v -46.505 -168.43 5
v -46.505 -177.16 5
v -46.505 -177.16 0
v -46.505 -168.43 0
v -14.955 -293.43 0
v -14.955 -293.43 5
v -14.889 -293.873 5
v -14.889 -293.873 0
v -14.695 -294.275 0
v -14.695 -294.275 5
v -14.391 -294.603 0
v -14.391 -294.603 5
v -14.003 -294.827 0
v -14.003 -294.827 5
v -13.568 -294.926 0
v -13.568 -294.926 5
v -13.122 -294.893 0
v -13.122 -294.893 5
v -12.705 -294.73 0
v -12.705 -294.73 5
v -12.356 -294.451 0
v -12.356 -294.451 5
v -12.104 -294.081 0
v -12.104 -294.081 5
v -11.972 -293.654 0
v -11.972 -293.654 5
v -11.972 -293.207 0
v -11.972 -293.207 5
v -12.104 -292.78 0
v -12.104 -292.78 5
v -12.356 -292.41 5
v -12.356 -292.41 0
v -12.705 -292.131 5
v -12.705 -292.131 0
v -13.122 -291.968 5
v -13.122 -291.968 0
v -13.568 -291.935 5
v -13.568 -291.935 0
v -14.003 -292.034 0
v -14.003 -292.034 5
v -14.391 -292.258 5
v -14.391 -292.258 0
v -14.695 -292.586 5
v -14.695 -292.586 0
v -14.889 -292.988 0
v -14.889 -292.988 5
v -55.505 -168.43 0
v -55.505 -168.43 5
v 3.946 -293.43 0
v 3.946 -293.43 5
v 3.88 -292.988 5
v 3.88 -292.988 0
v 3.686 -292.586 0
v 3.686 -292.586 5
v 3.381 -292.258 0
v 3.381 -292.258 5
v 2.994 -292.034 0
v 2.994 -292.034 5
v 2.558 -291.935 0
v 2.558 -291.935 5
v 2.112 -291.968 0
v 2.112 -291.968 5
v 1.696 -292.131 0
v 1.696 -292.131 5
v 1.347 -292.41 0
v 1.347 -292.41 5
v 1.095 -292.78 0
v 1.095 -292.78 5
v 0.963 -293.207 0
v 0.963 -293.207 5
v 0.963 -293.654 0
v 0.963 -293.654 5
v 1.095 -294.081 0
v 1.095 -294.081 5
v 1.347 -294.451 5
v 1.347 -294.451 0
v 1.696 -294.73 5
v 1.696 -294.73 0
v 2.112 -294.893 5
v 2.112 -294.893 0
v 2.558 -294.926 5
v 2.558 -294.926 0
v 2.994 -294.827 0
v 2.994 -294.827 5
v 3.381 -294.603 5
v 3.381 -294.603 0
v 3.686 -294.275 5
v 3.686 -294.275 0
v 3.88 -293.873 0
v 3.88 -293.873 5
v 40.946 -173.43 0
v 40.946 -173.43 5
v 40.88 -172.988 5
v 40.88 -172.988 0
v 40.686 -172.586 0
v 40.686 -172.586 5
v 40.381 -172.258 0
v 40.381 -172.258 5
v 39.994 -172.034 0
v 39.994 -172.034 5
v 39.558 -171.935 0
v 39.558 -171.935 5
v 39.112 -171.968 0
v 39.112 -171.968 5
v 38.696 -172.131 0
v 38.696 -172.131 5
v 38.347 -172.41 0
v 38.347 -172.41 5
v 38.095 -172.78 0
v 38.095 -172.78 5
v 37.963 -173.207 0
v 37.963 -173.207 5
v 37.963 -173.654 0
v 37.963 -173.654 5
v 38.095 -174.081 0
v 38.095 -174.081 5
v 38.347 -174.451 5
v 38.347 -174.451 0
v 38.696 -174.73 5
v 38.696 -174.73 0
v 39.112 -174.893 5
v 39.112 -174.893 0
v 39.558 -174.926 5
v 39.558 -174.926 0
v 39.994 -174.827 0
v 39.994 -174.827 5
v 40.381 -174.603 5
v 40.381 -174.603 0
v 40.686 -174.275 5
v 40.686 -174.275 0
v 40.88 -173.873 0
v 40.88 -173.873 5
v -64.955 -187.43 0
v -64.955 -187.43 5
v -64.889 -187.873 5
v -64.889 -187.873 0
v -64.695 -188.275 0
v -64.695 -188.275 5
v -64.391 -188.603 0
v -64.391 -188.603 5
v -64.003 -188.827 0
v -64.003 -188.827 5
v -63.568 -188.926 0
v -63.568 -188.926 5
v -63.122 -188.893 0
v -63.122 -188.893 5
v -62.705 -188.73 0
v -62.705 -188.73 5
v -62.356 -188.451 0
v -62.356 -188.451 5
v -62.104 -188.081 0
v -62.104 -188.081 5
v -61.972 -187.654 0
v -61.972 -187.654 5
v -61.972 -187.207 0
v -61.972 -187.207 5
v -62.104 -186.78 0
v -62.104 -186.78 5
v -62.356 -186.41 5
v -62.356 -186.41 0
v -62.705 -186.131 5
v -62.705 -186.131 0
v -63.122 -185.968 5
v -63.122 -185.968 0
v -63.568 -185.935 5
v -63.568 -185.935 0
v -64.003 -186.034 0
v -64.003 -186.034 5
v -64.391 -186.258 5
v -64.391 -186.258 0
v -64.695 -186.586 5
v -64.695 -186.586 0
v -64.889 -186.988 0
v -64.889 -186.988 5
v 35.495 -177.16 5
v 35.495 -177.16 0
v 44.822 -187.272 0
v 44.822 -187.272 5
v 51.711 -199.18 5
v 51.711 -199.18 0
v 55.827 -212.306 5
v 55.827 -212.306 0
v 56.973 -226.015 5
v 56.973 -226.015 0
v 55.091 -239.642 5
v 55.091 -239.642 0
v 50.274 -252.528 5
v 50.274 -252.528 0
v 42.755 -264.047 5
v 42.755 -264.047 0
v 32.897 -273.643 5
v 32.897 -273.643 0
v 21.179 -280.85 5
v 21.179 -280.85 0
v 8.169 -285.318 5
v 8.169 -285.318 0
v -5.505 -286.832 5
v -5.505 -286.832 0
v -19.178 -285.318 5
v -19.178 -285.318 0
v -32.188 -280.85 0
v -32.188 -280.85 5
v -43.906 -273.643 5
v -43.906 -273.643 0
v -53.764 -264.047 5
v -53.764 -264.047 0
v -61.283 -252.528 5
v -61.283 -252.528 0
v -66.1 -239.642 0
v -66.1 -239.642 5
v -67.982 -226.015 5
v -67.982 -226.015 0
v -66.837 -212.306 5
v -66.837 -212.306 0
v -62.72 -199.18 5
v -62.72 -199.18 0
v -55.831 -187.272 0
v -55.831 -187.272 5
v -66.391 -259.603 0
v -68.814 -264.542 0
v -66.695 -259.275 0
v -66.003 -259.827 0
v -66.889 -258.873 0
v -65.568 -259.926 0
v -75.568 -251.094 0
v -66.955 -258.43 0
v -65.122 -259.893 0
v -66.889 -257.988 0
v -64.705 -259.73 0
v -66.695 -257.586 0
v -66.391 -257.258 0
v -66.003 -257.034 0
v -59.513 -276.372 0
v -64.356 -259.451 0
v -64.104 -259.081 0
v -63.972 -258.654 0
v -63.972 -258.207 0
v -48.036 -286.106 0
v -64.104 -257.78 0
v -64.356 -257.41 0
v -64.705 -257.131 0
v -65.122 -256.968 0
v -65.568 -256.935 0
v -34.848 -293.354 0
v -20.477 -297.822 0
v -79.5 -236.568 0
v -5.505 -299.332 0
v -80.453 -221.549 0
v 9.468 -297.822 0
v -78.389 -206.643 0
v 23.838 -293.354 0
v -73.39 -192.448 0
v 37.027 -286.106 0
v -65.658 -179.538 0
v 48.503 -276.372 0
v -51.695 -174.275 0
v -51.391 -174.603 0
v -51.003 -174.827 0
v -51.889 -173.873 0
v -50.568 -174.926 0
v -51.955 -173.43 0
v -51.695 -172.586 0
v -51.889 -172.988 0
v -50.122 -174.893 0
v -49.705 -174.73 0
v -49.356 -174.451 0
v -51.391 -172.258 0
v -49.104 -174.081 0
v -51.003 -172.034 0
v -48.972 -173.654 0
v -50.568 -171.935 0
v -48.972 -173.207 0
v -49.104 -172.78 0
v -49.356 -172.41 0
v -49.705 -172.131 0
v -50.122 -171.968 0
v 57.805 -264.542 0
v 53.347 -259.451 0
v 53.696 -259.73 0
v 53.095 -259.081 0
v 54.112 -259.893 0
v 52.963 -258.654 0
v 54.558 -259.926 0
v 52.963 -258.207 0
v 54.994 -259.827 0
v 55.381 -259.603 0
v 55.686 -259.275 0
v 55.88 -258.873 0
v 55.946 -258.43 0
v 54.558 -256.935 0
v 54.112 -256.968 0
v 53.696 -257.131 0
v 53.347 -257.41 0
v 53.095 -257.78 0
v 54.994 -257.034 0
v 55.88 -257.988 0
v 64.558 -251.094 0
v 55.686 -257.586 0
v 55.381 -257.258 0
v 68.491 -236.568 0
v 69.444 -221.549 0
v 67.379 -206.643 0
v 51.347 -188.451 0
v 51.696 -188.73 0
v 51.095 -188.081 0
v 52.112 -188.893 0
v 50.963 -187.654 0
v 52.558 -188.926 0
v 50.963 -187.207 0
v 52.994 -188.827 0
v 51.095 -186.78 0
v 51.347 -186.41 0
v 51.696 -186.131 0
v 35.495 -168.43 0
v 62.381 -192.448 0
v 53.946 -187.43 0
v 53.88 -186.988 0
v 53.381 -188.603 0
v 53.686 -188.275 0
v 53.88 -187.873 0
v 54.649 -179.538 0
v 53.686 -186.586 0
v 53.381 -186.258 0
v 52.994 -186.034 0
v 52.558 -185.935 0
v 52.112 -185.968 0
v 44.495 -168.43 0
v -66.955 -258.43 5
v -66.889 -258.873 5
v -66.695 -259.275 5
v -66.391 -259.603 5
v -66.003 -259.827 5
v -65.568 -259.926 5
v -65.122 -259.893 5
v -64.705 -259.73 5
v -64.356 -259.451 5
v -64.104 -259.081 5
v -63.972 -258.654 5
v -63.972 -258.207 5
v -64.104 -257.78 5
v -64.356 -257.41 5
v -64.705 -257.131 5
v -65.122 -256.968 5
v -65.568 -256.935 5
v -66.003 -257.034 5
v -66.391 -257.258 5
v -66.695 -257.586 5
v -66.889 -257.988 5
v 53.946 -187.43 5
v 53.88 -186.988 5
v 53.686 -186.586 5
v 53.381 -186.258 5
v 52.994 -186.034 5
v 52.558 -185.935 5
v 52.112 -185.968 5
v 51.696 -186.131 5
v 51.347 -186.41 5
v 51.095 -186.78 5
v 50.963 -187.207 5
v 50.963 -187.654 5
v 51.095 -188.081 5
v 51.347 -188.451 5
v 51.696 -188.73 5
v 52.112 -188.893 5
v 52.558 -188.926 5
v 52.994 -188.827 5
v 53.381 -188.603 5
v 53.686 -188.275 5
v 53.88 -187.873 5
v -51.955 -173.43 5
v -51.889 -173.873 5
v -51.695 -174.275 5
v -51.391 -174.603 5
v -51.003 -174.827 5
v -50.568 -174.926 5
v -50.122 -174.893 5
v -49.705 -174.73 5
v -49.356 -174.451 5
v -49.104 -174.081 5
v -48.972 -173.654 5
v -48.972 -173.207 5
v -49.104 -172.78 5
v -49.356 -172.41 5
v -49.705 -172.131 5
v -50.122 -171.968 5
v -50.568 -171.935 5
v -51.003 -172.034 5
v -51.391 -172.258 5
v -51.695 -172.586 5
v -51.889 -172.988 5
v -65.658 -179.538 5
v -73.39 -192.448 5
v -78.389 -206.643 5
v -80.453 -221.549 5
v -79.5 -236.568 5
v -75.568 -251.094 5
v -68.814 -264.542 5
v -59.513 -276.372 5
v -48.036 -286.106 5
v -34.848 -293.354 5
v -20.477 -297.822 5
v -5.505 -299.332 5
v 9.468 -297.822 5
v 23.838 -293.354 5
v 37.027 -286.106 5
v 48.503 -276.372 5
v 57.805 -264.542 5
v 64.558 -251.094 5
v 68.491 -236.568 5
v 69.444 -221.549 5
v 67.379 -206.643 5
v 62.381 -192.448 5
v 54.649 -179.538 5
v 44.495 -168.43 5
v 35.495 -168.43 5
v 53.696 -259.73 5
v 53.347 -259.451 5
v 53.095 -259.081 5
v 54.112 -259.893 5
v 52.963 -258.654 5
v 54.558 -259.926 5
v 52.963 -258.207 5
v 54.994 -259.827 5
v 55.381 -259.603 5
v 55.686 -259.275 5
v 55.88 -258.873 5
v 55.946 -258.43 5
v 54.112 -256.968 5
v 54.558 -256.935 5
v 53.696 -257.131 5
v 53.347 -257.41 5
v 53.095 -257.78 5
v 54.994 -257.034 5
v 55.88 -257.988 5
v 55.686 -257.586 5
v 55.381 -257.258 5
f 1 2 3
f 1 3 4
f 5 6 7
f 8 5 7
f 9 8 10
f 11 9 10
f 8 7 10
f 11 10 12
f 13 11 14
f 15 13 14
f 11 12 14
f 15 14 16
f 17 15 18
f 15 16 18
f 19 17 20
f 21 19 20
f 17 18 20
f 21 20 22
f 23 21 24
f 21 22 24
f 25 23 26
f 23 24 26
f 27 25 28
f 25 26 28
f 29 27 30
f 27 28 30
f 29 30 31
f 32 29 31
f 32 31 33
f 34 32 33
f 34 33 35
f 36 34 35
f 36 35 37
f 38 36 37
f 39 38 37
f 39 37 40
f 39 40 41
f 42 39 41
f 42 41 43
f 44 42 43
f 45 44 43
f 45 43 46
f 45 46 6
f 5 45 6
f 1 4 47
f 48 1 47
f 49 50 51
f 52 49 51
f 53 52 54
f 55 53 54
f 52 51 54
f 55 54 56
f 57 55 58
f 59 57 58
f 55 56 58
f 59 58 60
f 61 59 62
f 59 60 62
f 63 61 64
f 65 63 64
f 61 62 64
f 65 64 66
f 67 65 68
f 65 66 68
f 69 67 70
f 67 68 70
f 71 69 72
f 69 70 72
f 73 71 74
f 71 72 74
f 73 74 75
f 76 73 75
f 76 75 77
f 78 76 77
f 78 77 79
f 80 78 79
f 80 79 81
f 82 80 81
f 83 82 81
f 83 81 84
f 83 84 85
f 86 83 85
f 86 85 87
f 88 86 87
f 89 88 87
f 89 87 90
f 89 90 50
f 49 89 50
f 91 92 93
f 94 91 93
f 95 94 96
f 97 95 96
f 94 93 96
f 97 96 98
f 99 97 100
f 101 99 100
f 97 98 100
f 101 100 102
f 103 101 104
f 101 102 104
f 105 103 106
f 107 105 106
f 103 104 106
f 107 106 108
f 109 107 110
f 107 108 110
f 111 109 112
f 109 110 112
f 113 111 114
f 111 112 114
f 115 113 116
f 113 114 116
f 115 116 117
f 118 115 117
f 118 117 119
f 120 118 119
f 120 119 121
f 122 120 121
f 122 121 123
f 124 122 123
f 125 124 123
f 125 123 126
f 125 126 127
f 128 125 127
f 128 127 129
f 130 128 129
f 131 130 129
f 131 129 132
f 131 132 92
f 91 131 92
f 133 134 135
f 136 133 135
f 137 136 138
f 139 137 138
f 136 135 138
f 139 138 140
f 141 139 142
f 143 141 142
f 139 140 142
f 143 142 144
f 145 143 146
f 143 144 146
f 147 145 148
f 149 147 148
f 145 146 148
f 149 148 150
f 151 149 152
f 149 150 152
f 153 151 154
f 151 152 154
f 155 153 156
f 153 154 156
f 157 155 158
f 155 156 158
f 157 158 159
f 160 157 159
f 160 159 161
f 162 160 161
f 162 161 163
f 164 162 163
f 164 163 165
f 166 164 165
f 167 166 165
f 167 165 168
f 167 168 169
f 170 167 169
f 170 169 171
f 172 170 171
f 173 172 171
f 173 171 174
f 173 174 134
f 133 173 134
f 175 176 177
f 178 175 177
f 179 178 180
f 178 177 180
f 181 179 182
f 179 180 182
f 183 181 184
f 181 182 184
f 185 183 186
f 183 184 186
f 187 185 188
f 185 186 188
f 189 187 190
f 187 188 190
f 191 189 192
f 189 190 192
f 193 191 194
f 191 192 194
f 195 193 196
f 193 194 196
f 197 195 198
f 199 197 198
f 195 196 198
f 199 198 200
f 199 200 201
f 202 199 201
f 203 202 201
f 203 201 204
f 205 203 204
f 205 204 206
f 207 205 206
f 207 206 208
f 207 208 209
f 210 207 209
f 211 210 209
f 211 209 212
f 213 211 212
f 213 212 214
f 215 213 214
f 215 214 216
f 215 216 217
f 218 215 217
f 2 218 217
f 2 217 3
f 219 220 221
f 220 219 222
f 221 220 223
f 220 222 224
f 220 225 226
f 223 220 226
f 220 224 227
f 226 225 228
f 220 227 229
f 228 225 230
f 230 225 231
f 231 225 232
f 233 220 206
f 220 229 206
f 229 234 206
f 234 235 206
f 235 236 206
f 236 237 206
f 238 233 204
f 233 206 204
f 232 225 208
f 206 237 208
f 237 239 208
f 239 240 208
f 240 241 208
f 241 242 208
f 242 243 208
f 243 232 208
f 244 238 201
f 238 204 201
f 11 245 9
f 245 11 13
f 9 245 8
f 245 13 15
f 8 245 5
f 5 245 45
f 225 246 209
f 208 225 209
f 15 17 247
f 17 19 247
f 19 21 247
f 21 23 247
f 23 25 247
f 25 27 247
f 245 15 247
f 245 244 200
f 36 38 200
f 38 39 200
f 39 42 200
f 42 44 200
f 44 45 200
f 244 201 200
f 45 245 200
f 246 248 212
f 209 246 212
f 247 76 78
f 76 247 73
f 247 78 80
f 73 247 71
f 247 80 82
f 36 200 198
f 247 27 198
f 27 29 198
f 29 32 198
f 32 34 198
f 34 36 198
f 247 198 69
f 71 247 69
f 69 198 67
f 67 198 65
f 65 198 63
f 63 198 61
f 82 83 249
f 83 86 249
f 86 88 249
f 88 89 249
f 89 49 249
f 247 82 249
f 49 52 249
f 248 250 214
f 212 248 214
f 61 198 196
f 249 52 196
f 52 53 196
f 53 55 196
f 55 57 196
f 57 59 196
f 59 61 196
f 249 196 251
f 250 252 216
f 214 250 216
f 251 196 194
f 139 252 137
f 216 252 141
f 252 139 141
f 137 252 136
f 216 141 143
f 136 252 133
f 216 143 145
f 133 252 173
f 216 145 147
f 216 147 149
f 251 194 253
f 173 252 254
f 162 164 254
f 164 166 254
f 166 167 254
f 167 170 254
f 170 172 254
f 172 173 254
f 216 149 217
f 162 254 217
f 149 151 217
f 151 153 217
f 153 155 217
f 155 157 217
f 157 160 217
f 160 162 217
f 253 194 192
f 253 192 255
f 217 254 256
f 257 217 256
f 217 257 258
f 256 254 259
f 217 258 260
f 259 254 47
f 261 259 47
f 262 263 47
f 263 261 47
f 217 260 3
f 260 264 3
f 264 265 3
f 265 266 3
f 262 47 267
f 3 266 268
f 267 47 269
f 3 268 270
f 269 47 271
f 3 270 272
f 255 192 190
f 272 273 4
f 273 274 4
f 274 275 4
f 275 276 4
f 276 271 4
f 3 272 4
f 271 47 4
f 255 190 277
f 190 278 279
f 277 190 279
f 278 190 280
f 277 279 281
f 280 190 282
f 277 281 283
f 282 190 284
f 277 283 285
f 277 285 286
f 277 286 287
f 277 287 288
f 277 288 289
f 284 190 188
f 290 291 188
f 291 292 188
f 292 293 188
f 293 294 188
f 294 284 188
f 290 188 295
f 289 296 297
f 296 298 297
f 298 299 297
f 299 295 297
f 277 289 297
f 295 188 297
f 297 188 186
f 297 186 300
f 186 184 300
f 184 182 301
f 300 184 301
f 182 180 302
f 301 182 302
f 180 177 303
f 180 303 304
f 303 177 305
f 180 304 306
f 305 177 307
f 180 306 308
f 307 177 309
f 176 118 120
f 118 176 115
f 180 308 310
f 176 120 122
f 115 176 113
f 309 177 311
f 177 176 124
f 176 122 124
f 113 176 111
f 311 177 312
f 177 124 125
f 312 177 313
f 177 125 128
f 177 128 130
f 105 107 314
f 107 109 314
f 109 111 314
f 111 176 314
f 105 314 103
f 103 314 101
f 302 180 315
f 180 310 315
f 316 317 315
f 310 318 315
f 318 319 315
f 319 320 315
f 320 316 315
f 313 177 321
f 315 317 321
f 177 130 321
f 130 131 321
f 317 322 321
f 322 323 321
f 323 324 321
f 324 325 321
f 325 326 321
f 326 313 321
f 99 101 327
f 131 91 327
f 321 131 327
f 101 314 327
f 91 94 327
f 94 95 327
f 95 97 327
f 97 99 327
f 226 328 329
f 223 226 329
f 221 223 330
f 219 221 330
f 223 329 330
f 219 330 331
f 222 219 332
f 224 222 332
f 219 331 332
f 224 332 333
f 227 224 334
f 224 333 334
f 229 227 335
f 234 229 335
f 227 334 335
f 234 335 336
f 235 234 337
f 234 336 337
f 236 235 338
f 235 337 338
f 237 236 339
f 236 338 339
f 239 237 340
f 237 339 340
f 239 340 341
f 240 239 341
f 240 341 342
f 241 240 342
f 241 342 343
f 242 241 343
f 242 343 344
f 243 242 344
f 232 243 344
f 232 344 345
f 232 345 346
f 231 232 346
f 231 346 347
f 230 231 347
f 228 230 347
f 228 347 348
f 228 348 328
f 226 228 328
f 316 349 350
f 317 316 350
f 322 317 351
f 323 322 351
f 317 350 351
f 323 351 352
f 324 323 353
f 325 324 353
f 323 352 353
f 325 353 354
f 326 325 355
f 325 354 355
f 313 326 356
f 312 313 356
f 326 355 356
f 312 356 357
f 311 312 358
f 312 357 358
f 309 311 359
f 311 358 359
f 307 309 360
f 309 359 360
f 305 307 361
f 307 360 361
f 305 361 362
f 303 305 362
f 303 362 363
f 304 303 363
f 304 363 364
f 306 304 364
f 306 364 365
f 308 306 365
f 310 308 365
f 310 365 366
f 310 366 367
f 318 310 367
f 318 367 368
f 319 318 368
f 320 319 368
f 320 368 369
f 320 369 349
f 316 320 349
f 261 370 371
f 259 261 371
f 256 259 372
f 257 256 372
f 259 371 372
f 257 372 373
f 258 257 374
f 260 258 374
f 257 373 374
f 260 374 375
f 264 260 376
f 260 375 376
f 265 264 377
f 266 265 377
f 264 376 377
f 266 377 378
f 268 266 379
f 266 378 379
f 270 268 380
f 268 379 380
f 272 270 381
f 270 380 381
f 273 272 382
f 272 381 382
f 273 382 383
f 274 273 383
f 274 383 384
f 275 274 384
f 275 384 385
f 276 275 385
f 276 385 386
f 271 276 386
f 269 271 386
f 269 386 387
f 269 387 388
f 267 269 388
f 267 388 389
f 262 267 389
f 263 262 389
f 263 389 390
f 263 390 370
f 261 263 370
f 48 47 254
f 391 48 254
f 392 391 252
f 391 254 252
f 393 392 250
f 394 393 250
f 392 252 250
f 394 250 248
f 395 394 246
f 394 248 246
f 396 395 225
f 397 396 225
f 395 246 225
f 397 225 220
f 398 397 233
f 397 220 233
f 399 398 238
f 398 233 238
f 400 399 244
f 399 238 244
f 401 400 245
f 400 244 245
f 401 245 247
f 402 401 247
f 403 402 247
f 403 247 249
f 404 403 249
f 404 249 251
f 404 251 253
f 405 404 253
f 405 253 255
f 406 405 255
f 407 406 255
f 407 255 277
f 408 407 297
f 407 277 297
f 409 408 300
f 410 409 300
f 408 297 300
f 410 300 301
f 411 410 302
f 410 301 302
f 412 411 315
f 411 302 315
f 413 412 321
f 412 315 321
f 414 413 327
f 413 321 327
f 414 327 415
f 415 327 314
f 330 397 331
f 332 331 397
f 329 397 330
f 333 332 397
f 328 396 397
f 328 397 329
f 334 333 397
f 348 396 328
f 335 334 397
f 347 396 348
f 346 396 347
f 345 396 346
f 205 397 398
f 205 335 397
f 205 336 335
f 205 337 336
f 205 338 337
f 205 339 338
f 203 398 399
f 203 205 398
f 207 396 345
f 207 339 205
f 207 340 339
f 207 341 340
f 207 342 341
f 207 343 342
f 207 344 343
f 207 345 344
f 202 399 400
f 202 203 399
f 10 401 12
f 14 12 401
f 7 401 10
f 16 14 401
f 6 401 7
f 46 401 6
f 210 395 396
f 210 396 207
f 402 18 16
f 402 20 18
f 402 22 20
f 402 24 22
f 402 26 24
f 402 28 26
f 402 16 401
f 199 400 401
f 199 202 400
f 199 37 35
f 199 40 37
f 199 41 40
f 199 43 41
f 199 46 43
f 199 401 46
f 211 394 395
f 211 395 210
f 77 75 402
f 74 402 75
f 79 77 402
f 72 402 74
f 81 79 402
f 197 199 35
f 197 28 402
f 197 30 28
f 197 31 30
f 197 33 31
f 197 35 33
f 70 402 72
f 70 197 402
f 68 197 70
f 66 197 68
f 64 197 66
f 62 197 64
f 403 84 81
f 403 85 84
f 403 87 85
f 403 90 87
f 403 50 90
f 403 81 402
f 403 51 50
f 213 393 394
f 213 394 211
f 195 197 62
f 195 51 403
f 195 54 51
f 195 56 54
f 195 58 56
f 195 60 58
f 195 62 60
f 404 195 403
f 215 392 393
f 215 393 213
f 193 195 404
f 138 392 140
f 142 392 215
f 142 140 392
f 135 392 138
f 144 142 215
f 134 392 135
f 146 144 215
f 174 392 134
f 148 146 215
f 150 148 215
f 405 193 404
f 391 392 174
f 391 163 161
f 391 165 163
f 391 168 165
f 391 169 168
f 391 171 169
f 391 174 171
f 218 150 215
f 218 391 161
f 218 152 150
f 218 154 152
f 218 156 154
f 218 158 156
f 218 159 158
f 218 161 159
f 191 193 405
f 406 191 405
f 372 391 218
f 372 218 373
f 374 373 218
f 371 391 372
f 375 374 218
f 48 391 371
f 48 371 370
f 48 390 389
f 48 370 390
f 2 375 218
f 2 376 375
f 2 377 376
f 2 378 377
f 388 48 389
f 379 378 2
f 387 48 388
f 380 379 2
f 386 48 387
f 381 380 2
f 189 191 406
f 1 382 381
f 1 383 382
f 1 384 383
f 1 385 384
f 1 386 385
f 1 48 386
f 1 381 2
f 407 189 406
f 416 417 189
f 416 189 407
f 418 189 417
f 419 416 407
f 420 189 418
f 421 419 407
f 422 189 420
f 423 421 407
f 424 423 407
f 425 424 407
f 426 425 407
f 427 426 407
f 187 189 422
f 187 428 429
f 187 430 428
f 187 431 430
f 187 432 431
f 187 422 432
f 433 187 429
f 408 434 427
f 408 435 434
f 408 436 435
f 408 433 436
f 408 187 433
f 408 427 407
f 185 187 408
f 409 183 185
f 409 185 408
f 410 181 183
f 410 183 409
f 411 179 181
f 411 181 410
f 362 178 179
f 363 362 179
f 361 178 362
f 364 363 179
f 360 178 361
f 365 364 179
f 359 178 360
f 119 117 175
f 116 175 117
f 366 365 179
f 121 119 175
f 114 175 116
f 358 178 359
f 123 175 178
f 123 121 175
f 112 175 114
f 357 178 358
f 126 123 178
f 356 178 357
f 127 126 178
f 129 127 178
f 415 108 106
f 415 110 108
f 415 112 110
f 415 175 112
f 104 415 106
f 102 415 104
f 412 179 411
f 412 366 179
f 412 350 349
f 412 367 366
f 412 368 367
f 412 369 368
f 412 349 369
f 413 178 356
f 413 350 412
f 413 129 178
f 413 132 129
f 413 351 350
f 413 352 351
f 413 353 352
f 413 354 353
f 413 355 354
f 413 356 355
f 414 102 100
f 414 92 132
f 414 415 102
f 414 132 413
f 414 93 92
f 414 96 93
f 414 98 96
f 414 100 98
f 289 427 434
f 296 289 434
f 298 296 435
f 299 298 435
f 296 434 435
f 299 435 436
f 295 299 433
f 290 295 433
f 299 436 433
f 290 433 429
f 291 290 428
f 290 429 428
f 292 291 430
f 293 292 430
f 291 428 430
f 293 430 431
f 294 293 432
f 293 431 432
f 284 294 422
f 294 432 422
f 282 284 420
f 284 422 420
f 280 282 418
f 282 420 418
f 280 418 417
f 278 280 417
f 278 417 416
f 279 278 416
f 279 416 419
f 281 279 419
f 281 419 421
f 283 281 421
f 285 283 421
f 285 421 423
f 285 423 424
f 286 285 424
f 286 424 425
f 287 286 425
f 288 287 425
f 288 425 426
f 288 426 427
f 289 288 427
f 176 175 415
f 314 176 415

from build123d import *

# Parameters (mm, degrees)
RESSALTO_EXTRUS_O1_DEPTH = 5
ESBO_O2_R                = 1.5
CORTE_EXTRUS_O1_DEPTH    = 311.009274327
ESBO_O3_W                = 82
ESBO_O3_H                = 18.792940288
CORTE_EXTRUS_O2_DEPTH    = 10


with BuildPart() as part:
    # Esboço1 → Ressalto-extrusão1 (new body)
    with BuildSketch(Plane.XY):
        with BuildLine():
            Line((44.495405461, -168.430491325), (22.44625518, -168.430491325))
            ThreePointArc((22.44625518, -168.430491325), (-5.504594539, -286.832190763), (-33.455444258, -168.430491325))
            Line((-33.455444258, -168.430491325), (-55.504594539, -168.430491325))
            ThreePointArc((-55.504594539, -168.430491325), (-5.504594539, -299.332190763), (44.495405461, -168.430491325))
        make_face()
    extrude(amount=RESSALTO_EXTRUS_O1_DEPTH)

    # Esboço2 → Corte-extrusão1 (cut, through all)
    with BuildSketch(Plane.XY.offset(5)):
        with Locations((39.44625518, -173.430491325)):
            Circle(ESBO_O2_R)
        with Locations((52.44625518, -187.430491325)):
            Circle(ESBO_O2_R)
        with Locations((54.44625518, -258.430491325)):
            Circle(ESBO_O2_R)
        with Locations(Location((-13.455444258, -293.430491325, 0), (0, 0, 180))):
            Circle(ESBO_O2_R)
        with Locations((2.44625518, -293.430491325)):
            Circle(ESBO_O2_R)
        with Locations(Location((-65.455444258, -258.430491325, 0), (0, 0, 180))):
            Circle(ESBO_O2_R)
        with Locations(Location((-63.455444258, -187.430491325, 0), (0, 0, 180))):
            Circle(ESBO_O2_R)
        with Locations(Location((-50.455444258, -173.430491325, 0), (0, 0, 180))):
            Circle(ESBO_O2_R)
    extrude(amount=-CORTE_EXTRUS_O1_DEPTH, mode=Mode.SUBTRACT)

    # Esboço3 → Corte-extrusão2 (cut)
    with BuildSketch(Plane.XY.offset(5)):
        with Locations((-5.504594539, -170.544921833)):
            Rectangle(ESBO_O3_W, ESBO_O3_H)
    extrude(amount=-CORTE_EXTRUS_O2_DEPTH, mode=Mode.SUBTRACT)


solid = part.part
